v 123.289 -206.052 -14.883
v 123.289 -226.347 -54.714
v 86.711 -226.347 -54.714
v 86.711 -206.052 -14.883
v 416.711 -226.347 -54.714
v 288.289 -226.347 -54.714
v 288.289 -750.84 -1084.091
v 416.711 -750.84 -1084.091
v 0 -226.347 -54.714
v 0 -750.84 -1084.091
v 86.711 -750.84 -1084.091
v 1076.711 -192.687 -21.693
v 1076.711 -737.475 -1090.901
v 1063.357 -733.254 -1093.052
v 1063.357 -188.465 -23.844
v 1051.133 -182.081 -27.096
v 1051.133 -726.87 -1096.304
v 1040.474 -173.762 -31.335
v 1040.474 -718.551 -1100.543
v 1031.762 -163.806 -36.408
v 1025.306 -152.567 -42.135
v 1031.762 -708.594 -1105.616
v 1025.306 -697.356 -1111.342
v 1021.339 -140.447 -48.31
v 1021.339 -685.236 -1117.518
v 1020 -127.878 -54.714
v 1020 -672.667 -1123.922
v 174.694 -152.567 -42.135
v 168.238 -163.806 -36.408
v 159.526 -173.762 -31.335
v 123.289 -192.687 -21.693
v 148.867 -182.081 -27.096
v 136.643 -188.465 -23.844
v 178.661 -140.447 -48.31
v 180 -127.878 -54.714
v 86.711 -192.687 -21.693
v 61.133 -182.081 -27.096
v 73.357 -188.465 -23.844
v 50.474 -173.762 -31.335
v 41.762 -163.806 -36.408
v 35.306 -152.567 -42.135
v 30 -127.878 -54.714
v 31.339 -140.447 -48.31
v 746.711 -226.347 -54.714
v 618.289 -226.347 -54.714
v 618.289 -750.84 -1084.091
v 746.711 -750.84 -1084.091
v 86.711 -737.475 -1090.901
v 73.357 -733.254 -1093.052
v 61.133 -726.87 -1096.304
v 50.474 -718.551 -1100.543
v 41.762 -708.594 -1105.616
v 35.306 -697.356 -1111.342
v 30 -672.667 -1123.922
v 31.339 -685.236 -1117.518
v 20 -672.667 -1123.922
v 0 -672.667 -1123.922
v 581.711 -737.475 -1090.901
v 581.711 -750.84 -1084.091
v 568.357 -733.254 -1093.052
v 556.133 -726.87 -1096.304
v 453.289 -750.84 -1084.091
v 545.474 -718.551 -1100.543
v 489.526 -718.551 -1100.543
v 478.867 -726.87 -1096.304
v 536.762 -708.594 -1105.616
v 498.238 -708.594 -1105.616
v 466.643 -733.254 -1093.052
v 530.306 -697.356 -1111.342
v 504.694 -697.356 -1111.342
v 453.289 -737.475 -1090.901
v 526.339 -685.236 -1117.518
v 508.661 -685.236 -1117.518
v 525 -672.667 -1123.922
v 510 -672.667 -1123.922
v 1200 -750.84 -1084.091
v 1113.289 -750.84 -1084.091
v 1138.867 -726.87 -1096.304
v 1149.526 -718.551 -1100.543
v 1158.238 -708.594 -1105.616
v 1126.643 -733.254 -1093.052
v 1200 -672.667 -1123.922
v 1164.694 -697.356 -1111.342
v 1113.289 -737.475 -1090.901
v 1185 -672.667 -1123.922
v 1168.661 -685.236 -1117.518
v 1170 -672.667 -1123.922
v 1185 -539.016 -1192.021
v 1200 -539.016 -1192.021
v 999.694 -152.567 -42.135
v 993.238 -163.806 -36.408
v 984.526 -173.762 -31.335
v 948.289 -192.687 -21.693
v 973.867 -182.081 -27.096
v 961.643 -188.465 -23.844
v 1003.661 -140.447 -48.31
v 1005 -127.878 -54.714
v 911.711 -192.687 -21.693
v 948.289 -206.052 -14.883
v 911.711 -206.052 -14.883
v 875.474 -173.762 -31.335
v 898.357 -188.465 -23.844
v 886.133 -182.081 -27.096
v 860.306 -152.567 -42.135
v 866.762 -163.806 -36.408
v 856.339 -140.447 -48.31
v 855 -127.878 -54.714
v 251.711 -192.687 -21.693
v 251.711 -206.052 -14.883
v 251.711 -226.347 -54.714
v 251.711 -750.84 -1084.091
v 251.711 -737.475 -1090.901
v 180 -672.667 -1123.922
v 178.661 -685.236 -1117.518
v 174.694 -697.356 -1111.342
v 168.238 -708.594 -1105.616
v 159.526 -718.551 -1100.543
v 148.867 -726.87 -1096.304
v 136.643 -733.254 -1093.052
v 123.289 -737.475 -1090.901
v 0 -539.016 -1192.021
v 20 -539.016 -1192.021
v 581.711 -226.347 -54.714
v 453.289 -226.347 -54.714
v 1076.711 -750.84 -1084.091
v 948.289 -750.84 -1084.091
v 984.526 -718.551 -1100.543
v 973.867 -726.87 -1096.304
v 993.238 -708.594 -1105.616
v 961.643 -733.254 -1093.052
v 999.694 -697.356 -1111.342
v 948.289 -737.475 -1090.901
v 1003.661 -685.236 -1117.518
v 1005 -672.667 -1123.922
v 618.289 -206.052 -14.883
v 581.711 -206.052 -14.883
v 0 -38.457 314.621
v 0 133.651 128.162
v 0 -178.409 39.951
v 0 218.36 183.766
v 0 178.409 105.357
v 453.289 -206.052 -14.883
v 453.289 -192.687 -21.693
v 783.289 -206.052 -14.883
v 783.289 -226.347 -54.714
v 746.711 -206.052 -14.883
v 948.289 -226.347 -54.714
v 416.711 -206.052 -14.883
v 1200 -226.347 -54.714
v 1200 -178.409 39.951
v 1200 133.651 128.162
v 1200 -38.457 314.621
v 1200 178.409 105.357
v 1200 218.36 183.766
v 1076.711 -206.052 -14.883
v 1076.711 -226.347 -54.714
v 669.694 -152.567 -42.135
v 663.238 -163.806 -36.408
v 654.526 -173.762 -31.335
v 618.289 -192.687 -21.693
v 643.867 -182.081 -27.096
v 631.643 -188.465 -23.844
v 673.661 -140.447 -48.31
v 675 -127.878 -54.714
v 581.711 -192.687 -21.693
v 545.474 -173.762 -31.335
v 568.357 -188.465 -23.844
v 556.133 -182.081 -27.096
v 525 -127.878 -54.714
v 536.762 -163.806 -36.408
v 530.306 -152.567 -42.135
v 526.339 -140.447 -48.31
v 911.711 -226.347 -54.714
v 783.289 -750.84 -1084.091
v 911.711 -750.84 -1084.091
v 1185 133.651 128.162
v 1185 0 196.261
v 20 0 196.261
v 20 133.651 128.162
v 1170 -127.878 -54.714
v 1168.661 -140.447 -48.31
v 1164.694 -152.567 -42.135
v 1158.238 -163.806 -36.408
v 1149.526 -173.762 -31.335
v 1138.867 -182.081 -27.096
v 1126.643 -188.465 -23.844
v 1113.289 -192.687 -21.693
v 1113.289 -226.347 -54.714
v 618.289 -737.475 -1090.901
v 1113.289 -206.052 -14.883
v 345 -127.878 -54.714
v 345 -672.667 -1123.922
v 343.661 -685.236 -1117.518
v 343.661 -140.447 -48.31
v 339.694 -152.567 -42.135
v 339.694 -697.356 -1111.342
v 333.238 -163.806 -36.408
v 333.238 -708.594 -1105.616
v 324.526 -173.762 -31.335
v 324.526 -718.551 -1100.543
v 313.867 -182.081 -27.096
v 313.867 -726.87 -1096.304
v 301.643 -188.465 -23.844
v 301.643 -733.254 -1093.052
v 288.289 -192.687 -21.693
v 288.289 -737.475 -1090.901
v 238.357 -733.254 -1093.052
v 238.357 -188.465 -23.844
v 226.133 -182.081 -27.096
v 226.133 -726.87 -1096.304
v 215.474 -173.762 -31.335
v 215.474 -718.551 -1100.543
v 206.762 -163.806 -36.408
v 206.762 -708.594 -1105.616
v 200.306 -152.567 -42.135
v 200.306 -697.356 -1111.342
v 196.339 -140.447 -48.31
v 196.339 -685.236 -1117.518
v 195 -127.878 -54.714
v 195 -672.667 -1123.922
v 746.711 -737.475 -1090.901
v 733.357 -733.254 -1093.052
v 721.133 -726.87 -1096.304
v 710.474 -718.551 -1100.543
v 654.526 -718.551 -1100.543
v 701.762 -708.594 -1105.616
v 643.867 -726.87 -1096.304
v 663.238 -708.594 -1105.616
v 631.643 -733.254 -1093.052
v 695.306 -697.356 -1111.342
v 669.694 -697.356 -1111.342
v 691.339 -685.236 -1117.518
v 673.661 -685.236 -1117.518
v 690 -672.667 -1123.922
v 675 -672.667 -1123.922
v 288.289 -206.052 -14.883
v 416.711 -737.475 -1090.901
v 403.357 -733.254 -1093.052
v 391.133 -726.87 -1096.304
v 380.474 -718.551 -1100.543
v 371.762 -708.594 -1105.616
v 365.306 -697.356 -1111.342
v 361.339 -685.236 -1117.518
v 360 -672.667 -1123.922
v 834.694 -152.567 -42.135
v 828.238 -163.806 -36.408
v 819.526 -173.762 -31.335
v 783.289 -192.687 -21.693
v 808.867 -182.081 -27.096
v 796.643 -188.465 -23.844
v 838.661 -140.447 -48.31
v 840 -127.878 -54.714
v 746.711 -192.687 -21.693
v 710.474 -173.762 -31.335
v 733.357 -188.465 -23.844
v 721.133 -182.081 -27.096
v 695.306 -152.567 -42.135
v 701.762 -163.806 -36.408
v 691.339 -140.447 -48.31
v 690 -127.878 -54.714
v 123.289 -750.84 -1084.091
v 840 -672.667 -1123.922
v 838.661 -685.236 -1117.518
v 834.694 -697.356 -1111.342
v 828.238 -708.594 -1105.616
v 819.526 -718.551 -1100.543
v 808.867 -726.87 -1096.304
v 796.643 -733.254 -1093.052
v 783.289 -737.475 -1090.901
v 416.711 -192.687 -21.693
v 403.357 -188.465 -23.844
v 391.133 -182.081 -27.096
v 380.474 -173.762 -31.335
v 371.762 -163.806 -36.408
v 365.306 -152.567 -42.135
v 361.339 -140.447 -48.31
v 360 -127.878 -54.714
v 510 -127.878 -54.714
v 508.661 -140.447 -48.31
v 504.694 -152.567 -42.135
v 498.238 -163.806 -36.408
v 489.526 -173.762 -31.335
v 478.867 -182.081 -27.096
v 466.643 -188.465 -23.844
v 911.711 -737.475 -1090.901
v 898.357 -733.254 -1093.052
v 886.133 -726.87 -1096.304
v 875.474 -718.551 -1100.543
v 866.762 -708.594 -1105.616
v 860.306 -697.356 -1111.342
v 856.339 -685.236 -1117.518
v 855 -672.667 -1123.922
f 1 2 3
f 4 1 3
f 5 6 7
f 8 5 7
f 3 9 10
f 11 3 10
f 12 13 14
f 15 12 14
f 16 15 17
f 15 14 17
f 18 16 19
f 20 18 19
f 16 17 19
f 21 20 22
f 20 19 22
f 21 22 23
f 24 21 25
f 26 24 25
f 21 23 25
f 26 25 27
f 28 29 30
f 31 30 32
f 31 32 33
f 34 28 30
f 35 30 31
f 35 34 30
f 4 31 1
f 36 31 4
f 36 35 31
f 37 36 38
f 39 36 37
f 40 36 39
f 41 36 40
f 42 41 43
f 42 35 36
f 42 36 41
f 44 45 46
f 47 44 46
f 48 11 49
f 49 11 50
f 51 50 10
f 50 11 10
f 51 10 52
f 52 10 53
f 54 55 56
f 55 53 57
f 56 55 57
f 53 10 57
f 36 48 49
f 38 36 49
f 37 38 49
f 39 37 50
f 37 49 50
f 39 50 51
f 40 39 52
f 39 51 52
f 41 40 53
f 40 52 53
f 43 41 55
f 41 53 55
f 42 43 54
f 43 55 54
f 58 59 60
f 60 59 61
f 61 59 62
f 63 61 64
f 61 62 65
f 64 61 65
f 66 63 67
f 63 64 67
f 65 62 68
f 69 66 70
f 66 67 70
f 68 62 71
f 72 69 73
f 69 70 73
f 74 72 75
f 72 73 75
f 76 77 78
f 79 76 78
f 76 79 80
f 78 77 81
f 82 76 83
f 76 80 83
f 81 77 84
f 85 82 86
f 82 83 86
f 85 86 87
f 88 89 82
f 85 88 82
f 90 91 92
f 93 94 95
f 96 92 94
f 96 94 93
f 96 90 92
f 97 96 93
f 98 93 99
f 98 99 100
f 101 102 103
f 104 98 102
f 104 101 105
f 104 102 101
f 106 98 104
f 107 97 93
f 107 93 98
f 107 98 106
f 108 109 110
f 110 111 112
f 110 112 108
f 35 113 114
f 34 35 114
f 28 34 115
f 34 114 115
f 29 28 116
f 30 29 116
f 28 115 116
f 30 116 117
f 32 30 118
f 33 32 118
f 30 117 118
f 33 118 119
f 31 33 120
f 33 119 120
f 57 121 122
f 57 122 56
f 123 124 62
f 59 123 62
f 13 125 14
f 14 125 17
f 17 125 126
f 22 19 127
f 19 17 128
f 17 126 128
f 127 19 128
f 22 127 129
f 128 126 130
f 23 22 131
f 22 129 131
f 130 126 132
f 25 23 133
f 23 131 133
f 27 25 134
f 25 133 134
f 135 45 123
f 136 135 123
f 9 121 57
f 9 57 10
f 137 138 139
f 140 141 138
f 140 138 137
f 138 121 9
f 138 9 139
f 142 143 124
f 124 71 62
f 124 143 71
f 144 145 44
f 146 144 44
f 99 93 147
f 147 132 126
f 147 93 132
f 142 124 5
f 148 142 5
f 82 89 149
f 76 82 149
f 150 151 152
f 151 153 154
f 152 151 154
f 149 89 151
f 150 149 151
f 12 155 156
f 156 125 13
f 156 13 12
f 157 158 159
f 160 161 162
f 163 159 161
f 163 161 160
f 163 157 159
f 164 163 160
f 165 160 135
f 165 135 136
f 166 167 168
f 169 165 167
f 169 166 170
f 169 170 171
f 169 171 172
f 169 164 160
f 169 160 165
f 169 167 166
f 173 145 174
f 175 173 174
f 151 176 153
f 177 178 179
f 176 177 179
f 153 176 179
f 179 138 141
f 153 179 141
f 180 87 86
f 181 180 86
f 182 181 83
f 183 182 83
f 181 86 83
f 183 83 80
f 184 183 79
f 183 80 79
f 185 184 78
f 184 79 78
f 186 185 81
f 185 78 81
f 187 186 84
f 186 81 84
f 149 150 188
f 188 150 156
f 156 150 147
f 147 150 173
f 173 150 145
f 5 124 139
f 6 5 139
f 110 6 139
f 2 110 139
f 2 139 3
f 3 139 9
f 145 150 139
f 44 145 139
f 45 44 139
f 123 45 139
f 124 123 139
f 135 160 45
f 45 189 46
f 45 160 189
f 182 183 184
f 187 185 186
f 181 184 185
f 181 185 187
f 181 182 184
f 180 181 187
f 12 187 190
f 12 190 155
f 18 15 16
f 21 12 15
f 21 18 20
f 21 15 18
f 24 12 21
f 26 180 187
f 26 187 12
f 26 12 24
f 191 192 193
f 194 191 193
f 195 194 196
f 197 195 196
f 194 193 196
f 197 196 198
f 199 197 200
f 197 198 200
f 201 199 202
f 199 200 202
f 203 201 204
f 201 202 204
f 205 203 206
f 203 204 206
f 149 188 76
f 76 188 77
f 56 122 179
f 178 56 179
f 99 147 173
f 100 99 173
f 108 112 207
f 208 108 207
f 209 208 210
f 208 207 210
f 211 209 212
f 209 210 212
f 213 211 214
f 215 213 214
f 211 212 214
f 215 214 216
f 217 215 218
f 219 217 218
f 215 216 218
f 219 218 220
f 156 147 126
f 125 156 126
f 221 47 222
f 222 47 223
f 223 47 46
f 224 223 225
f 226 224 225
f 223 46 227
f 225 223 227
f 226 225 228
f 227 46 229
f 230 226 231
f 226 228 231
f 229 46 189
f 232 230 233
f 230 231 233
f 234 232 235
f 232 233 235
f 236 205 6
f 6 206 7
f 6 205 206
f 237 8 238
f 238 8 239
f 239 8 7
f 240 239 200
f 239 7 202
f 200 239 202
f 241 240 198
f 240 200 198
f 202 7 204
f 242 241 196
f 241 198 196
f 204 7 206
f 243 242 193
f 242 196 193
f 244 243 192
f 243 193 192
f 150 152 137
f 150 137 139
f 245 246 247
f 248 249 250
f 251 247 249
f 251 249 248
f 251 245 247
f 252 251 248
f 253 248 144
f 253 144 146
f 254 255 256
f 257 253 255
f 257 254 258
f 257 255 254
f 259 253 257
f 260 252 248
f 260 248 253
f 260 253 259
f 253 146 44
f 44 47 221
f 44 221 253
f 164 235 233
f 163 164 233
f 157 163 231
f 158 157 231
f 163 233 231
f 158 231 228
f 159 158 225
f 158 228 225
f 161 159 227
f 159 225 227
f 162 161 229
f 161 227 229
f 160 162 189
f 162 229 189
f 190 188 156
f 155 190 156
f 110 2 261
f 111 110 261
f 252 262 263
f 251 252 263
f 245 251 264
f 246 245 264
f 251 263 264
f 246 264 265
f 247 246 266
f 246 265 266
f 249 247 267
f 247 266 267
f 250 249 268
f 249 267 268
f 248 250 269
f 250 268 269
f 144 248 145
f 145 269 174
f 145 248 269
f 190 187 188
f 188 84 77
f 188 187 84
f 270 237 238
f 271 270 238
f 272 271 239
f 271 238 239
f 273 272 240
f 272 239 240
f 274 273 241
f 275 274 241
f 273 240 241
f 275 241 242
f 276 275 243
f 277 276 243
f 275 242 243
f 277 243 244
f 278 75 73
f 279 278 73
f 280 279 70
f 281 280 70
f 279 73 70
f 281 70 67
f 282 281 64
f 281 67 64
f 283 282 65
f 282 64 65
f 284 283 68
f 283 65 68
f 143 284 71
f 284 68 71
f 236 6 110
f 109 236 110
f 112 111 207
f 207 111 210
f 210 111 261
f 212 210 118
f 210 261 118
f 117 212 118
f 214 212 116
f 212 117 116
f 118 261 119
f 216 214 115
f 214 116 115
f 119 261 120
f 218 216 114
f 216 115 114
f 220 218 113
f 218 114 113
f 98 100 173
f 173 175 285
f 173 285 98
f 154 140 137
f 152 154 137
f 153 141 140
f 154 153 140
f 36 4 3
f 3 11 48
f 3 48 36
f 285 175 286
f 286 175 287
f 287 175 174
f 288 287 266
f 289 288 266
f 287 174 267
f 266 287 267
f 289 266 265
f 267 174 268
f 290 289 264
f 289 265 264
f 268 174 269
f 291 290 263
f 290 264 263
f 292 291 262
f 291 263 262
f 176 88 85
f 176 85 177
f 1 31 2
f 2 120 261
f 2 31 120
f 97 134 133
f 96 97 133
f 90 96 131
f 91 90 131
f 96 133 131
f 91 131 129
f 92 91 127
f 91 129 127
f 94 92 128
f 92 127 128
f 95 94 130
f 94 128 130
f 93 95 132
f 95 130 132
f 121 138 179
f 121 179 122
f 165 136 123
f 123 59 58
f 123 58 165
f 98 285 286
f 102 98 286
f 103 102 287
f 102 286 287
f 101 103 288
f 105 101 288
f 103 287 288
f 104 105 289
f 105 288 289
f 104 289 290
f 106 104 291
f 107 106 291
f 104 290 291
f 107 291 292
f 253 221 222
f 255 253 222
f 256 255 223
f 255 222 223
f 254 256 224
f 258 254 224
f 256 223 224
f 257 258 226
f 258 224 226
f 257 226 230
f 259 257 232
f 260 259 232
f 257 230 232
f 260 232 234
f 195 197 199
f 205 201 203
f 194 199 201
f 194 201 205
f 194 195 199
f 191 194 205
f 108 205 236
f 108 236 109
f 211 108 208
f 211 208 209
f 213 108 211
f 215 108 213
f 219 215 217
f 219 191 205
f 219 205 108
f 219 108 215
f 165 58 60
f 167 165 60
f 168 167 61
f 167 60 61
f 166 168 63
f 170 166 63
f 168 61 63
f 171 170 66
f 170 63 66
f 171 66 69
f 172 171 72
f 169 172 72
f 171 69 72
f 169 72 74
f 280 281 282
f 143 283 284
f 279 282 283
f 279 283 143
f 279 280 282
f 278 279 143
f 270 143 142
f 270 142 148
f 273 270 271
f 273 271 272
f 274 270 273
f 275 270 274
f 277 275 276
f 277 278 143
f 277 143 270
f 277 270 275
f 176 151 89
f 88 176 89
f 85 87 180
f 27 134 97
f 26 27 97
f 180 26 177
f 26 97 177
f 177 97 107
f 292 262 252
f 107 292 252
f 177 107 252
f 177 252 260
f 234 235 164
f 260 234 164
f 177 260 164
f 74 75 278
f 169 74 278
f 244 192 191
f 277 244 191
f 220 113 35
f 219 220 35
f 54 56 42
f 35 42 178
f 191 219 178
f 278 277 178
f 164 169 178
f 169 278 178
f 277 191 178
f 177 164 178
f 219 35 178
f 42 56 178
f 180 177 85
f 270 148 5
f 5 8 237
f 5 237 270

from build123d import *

# Parameters (mm, degrees)
BOSS_EXTRUDE1_DEPTH = 1200
CUT_EXTRUDE1_DEPTH  = 1200
BOSS_EXTRUDE2_DEPTH = 20
BOSS_EXTRUDE6_DEPTH = 15


with BuildPart() as part:
    # Sketch1 → Boss-Extrude1 (new body)
    with BuildSketch(Plane(origin=(0, 0, 0), x_dir=(0, 0, -1), z_dir=(1, 0, 0))):
        Polygon((54.714181984, -127.878268169), (0, -100), (-196.261050551, 0), (-105.357341624, 178.408574129), (-183.765915753, 218.359738106), (-314.620788656, -38.457410151), (-39.951163977, -178.408574129), (54.714181984, -226.346681732), (1084.090701019, -750.840215293), (1123.92201101, -672.666867856), align=None)
    extrude(amount=BOSS_EXTRUDE1_DEPTH)

    # Sketch2 → Cut-Extrude1 (cut)
    with BuildSketch(Plane(origin=(0, -593.277605242, -1164.372860728), x_dir=(-1, 0, 0), z_dir=(0, -0.45399049973954697, -0.8910065241883679))):
        with BuildLine():
            ThreePointArc((-1076.711357012, -161.83665133), (-1035.853367703, -135.21654868), (-1020, -89.100652419))
            Line((-1020, -89.100652419), (-1170, -89.100652419))
            ThreePointArc((-1170, -89.100652419), (-1154.146632297, -135.21654868), (-1113.288642988, -161.83665133))
            Line((-1113.288642988, -161.83665133), (-1113.288642988, -176.83665133))
            Line((-1113.288642988, -176.83665133), (-1076.711357012, -176.83665133))
            Line((-1076.711357012, -176.83665133), (-1076.711357012, -161.83665133))
        make_face()
        with BuildLine():
            ThreePointArc((-911.711357012, -161.83665133), (-870.853367703, -135.21654868), (-855, -89.100652419))
            Line((-855, -89.100652419), (-1005, -89.100652419))
            ThreePointArc((-1005, -89.100652419), (-989.146632297, -135.21654868), (-948.288642988, -161.83665133))
            Line((-948.288642988, -161.83665133), (-948.288642988, -176.83665133))
            Line((-948.288642988, -176.83665133), (-911.711357012, -176.83665133))
            Line((-911.711357012, -176.83665133), (-911.711357012, -161.83665133))
        make_face()
        with BuildLine():
            ThreePointArc((-746.711357012, -161.83665133), (-705.853367703, -135.21654868), (-690, -89.100652419))
            Line((-690, -89.100652419), (-840, -89.100652419))
            ThreePointArc((-840, -89.100652419), (-824.146632297, -135.21654868), (-783.288642988, -161.83665133))
            Line((-783.288642988, -161.83665133), (-783.288642988, -176.83665133))
            Line((-783.288642988, -176.83665133), (-746.711357012, -176.83665133))
            Line((-746.711357012, -176.83665133), (-746.711357012, -161.83665133))
        make_face()
        with BuildLine():
            Line((-525, -89.100652419), (-675, -89.100652419))
            ThreePointArc((-675, -89.100652419), (-659.146632297, -135.21654868), (-618.288642988, -161.83665133))
            Line((-618.288642988, -161.83665133), (-618.288642988, -176.83665133))
            Line((-618.288642988, -176.83665133), (-581.711357012, -176.83665133))
            Line((-581.711357012, -176.83665133), (-581.711357012, -161.83665133))
            ThreePointArc((-581.711357012, -161.83665133), (-540.853367703, -135.21654868), (-525, -89.100652419))
        make_face()
        with BuildLine():
            Line((-360, -89.100652419), (-510, -89.100652419))
            ThreePointArc((-510, -89.100652419), (-494.146632297, -135.21654868), (-453.288642988, -161.83665133))
            Line((-453.288642988, -161.83665133), (-453.288642988, -176.83665133))
            Line((-453.288642988, -176.83665133), (-416.711357012, -176.83665133))
            Line((-416.711357012, -176.83665133), (-416.711357012, -161.83665133))
            ThreePointArc((-416.711357012, -161.83665133), (-375.853367703, -135.21654868), (-360, -89.100652419))
        make_face()
        with BuildLine():
            Line((-195, -89.100652419), (-345, -89.100652419))
            ThreePointArc((-345, -89.100652419), (-329.146632297, -135.21654868), (-288.288642988, -161.83665133))
            Line((-288.288642988, -161.83665133), (-288.288642988, -176.83665133))
            Line((-288.288642988, -176.83665133), (-251.711357012, -176.83665133))
            Line((-251.711357012, -176.83665133), (-251.711357012, -161.83665133))
            ThreePointArc((-251.711357012, -161.83665133), (-210.853367703, -135.21654868), (-195, -89.100652419))
        make_face()
        with BuildLine():
            Line((-30, -89.100652419), (-180, -89.100652419))
            ThreePointArc((-180, -89.100652419), (-164.146632297, -135.21654868), (-123.288642988, -161.83665133))
            Line((-123.288642988, -161.83665133), (-123.288642988, -176.83665133))
            Line((-123.288642988, -176.83665133), (-86.711357012, -176.83665133))
            Line((-86.711357012, -176.83665133), (-86.711357012, -161.83665133))
            ThreePointArc((-86.711357012, -161.83665133), (-45.853367703, -135.21654868), (-30, -89.100652419))
        make_face()
    extrude(amount=-CUT_EXTRUDE1_DEPTH, mode=Mode.SUBTRACT)

    # Sketch4 → Boss-Extrude2 (add)
    with BuildSketch(Plane.ZY):
        Polygon((196.261050551, 0), (128.16247559, 133.650978628), (-1192.020585971, -539.015889228), (-1123.92201101, -672.666867856), align=None)
    extrude(amount=-BOSS_EXTRUDE2_DEPTH)

    # Sketch14 → Boss-Extrude6 (add)
    with BuildSketch(Plane(origin=(1200, 0, 0), x_dir=(0, 0, -1), z_dir=(1, 0, 0))):
        Polygon((-196.261050551, 0), (-128.16247559, 133.650978628), (1192.020585971, -539.015889228), (1123.92201101, -672.666867856), align=None)
    extrude(amount=-BOSS_EXTRUDE6_DEPTH)


solid = part.part
